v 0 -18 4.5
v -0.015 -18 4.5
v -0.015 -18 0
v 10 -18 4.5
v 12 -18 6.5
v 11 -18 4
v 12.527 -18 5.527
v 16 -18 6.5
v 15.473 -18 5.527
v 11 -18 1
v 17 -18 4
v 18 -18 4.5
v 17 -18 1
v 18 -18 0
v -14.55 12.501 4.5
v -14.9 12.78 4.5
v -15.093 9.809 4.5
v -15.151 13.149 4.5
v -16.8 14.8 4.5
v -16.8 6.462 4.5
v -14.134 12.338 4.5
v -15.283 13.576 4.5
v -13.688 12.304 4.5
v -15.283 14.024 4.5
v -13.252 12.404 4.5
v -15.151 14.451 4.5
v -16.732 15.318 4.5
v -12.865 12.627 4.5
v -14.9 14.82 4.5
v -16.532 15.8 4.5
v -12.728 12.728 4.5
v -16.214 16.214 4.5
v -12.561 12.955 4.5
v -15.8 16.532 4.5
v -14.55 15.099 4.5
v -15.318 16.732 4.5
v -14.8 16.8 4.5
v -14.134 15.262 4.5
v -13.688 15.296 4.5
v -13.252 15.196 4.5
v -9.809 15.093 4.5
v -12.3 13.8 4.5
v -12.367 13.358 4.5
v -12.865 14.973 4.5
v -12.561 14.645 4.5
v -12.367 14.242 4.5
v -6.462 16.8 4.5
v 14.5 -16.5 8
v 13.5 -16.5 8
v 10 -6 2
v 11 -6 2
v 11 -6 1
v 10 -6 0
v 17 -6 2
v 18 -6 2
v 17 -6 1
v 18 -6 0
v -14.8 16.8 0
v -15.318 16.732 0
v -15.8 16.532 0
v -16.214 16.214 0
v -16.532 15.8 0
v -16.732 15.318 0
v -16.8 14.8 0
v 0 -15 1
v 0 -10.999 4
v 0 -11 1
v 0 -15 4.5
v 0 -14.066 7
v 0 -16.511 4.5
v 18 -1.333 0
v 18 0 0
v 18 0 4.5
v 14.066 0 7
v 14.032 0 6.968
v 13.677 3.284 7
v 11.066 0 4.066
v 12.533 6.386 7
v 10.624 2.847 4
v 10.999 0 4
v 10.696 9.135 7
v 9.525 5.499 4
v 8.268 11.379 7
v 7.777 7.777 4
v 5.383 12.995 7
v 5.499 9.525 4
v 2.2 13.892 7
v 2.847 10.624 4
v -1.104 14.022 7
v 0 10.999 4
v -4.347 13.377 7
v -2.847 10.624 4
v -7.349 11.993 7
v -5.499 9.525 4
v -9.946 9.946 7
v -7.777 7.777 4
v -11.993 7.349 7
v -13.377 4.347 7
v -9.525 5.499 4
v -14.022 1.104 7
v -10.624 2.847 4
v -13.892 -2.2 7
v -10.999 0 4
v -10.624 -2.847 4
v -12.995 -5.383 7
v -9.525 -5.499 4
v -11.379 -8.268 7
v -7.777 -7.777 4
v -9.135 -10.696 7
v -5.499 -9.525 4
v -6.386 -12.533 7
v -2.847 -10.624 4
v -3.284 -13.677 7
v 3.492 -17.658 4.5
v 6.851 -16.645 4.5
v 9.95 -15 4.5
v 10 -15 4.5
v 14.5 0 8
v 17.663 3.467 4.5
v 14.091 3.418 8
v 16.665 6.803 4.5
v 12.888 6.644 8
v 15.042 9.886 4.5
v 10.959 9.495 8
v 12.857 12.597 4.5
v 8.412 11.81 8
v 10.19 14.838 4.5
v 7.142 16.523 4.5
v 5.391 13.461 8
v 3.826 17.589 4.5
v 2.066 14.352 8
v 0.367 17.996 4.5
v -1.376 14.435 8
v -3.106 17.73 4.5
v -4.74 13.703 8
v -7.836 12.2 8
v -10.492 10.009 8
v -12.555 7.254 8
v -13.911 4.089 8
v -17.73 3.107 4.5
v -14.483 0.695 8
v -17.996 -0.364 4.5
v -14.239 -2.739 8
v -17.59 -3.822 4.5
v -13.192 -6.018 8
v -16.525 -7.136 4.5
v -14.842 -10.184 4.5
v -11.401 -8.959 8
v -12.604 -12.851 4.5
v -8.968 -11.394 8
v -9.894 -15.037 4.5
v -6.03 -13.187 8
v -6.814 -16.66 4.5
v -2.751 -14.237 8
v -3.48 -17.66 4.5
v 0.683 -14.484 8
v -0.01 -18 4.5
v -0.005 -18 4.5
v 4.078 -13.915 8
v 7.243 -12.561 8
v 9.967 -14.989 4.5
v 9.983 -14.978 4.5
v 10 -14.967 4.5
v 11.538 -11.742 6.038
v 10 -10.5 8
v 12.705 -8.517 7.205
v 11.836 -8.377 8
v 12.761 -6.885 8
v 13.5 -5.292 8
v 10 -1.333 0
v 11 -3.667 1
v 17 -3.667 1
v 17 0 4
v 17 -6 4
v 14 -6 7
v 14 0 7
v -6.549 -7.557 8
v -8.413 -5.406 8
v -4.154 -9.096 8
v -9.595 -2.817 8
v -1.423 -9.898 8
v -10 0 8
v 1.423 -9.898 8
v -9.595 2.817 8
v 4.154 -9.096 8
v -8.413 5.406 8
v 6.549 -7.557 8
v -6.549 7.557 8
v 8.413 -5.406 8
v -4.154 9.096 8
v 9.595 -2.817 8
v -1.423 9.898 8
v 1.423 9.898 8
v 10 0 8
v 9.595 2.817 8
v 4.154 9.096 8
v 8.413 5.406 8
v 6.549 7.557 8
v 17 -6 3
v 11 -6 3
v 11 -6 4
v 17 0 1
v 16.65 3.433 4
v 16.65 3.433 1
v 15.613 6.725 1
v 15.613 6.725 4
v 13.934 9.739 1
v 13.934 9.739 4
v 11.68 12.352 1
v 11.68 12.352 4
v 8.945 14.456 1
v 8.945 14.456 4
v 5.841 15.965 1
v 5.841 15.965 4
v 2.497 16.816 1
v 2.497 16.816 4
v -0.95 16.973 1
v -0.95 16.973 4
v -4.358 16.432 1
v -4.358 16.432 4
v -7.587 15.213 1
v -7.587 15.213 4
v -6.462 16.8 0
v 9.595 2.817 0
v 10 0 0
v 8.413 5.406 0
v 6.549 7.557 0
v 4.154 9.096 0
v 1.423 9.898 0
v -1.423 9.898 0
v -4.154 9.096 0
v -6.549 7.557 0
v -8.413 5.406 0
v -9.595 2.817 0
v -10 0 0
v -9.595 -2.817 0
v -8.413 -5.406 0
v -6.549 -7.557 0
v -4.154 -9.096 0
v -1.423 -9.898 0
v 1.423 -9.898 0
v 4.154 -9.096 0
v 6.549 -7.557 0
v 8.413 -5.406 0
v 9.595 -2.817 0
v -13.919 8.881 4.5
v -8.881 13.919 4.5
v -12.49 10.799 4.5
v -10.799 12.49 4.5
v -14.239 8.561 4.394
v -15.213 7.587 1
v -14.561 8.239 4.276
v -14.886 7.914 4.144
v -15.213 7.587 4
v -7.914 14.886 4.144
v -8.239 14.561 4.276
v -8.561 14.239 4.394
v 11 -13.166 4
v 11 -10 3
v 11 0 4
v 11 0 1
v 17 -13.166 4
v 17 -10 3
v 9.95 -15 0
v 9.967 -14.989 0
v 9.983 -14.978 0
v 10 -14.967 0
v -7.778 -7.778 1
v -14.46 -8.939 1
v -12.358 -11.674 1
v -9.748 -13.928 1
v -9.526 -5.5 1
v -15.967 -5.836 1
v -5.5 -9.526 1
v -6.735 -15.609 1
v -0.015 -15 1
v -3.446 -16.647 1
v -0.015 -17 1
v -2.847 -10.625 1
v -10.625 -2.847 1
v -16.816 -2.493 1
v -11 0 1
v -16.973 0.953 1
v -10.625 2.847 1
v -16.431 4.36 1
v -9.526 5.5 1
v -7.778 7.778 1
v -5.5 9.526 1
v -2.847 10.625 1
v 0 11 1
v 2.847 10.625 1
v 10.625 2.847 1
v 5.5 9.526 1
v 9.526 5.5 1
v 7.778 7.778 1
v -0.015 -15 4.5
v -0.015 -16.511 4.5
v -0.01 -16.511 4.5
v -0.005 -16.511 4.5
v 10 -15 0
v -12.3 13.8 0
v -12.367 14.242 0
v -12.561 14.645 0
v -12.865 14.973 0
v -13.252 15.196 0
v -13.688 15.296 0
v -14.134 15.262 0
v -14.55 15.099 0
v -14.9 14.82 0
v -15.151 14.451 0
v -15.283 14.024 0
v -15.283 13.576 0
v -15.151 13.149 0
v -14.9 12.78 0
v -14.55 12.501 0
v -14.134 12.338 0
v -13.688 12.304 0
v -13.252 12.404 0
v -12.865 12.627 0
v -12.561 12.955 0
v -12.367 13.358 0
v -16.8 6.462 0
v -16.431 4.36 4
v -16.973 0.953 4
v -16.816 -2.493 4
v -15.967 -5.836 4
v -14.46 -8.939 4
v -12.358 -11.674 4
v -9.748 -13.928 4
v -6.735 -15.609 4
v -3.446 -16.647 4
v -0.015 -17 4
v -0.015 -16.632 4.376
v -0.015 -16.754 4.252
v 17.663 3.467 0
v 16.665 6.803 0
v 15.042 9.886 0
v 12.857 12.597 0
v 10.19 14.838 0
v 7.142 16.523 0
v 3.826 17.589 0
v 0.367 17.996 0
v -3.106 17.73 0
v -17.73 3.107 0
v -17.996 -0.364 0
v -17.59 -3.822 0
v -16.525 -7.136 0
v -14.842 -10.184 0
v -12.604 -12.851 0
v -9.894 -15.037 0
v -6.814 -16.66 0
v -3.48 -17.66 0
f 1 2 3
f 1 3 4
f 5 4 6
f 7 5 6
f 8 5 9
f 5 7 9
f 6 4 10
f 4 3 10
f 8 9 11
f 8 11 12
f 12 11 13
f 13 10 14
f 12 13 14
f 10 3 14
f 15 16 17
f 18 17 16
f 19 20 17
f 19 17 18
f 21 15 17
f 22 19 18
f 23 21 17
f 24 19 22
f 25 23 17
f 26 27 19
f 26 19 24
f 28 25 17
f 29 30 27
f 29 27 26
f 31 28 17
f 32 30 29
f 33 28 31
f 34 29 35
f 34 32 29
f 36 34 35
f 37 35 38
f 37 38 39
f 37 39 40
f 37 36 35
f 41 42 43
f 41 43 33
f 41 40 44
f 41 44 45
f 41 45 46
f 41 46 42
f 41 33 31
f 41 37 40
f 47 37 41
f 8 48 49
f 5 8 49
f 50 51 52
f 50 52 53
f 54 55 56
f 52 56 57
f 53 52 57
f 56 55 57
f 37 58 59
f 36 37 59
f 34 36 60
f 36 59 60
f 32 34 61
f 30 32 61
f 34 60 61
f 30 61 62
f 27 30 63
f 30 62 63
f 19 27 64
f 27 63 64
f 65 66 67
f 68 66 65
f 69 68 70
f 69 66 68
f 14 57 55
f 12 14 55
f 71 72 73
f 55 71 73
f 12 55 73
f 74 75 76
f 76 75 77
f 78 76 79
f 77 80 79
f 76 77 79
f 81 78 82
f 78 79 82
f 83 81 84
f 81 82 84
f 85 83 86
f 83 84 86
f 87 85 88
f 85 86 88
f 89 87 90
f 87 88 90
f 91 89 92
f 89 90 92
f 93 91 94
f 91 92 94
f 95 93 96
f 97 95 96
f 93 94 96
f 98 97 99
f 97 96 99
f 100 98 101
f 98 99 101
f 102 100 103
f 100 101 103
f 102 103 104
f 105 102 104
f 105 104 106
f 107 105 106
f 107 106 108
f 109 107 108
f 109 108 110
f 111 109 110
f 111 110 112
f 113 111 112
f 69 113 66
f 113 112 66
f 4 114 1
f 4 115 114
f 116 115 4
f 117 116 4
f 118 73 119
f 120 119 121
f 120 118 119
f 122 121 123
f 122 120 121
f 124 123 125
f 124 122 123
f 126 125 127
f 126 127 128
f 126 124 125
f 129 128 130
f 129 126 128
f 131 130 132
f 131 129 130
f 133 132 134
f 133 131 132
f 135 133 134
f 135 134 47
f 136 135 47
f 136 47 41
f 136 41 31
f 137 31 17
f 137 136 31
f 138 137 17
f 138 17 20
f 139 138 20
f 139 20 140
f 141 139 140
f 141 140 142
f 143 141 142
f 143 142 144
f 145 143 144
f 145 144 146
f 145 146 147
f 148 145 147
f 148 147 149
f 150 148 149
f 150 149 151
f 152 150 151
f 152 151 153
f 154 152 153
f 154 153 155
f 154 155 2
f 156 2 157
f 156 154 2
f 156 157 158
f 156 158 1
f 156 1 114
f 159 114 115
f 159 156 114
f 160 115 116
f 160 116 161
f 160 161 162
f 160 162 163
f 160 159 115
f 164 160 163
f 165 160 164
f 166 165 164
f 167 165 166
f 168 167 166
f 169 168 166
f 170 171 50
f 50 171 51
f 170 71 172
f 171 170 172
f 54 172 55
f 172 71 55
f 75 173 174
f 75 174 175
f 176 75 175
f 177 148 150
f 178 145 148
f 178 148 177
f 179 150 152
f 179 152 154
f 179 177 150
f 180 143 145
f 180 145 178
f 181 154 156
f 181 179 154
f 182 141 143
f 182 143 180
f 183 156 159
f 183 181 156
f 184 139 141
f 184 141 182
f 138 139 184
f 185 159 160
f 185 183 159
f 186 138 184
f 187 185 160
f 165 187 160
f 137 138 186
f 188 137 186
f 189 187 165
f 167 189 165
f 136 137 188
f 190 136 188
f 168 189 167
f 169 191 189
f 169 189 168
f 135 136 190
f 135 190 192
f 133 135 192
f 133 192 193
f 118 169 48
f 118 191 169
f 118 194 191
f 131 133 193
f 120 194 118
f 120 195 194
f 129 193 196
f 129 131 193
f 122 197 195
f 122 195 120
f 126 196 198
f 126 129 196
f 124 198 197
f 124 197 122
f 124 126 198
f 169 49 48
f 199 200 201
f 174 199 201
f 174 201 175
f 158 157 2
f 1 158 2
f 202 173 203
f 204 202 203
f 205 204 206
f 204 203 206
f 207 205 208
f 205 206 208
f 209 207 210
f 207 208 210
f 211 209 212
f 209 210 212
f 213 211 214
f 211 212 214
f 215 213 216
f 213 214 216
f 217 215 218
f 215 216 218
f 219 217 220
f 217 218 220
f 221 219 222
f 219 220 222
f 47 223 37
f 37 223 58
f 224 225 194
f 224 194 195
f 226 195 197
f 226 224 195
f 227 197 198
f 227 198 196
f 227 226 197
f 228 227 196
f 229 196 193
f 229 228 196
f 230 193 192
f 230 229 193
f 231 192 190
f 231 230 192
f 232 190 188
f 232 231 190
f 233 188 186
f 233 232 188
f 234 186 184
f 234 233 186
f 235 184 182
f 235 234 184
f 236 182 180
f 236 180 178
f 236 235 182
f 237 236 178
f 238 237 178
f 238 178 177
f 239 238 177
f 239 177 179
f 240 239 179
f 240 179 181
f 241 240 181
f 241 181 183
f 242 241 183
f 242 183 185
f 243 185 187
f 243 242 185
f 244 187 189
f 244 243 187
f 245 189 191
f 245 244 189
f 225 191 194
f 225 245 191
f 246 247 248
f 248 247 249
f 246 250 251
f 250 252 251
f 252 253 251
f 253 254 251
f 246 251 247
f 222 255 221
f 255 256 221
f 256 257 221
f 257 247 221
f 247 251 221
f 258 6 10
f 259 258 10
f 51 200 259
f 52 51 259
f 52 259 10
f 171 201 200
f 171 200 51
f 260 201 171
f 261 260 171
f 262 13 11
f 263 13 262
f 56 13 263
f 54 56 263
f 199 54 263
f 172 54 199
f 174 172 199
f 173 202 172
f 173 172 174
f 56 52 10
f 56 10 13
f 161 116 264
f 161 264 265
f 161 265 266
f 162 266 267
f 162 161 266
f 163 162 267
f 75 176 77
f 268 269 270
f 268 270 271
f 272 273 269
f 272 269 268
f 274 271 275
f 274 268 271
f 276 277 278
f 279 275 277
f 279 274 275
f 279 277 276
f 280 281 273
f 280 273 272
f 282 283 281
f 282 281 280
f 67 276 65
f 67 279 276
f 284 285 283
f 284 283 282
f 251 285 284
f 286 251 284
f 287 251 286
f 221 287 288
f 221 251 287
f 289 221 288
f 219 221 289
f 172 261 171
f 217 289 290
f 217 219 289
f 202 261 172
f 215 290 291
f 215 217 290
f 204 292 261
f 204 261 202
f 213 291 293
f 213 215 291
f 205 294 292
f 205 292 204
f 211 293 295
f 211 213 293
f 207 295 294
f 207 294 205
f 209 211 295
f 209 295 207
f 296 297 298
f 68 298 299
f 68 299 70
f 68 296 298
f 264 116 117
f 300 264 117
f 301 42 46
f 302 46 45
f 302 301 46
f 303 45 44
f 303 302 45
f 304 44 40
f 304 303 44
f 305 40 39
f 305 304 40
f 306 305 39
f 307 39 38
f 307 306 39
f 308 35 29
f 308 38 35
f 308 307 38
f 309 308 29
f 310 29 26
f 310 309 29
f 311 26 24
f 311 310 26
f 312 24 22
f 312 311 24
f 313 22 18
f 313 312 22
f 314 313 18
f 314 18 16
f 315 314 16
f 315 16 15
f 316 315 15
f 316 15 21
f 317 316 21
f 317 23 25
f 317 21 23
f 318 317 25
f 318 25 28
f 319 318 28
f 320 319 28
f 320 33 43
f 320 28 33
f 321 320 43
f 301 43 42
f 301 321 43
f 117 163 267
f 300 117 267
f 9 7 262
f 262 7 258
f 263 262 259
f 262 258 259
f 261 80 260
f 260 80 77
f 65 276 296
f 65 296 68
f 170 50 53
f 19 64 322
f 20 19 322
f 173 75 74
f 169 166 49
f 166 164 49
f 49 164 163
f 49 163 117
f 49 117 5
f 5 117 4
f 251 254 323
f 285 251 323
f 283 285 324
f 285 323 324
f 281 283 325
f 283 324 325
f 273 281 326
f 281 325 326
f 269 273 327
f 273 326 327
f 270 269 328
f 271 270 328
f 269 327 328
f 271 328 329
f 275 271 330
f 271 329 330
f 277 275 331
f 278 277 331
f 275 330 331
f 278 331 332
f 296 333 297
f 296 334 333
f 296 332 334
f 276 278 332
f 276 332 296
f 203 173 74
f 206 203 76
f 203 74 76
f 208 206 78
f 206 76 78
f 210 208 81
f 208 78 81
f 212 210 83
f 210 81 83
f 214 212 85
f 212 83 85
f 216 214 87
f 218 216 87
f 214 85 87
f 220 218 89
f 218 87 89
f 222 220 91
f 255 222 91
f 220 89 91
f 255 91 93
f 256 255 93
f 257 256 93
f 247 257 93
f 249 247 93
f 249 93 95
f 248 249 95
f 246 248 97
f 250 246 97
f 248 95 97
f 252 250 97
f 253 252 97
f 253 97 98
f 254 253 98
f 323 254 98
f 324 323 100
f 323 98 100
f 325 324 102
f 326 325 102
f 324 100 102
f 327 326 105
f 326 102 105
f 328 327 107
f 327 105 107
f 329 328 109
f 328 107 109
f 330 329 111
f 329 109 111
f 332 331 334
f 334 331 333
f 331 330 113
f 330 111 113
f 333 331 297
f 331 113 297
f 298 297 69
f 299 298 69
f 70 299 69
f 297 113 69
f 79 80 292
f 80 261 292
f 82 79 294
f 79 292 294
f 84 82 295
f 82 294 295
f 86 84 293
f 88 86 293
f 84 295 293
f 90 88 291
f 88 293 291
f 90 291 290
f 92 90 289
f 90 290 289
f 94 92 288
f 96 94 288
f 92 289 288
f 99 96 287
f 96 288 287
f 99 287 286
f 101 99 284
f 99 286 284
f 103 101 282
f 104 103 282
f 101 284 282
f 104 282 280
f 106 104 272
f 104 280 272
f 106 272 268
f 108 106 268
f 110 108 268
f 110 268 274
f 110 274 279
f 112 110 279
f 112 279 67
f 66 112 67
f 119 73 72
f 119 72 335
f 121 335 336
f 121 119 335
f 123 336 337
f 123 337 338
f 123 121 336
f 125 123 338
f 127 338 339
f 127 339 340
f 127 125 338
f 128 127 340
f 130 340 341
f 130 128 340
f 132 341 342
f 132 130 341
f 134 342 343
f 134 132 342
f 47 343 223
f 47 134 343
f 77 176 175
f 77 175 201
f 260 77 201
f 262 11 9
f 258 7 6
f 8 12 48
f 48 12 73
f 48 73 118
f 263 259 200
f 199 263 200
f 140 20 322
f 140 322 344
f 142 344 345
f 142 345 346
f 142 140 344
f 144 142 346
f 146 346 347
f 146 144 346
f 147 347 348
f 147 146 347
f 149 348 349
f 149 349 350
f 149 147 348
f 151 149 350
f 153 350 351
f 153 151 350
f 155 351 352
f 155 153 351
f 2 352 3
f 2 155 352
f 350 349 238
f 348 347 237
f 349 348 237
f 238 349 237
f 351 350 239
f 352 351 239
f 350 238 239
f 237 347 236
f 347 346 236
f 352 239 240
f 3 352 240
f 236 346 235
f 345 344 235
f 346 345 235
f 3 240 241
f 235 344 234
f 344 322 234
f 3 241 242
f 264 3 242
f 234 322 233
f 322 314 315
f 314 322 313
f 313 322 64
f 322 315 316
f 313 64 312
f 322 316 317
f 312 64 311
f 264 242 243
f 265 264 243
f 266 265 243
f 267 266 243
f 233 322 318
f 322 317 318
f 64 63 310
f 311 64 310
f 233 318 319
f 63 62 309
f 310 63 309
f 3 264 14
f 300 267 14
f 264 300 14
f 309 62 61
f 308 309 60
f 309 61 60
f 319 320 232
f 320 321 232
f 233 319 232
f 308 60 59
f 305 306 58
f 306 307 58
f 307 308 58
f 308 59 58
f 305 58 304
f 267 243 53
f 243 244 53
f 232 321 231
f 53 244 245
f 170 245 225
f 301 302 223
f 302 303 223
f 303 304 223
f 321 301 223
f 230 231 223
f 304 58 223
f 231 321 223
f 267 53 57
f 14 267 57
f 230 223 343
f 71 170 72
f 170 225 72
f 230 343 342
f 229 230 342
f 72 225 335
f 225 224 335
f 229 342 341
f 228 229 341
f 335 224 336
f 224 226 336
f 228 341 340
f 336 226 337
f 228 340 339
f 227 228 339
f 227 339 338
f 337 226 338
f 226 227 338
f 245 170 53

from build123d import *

# Parameters (mm, degrees)
F7_DEPTH       = 18
F8_ANGLE       = 270
F9_DEPTH       = 18
F15_DEPTH      = 6
F16_DEPTH      = 7
F16_DEPTH_BACK = 1
F17_T4_DEPTH   = 22.2867319519
F20_DEPTH      = 4.5
F19_R          = 1.5
F21_DEPTH      = 5
F23_W          = 11.0148127368
F23_H          = 3
F24_DEPTH      = 4.5
F25_SIZE       = 3.5
F26_SIZE       = 1.5


# Not quite as in the source:
# - a fillet or chamfer that OpenCascade refuses, or shapes differently, is made with other operations: its cross-section is extruded or revolved along the edge and cut away or added


with BuildPart() as f5:
    # F0 (on Front) → F5 (revolve)
    with BuildSketch(Plane.XZ):
        Polygon((10, 0), (18, 0), (18, 4.5), (14.5, 8), (10, 8), align=None)
    revolve(axis=Axis((0, 0, 0), (0, 0, 1)))

    # F1 (on Front) → F7 (join)
    with BuildSketch(Plane.XZ):
        Polygon((10, 0), (18, 0), (18, 4.5), (14.5, 8), (10, 8), align=None)
    extrude(amount=F7_DEPTH)


with BuildPart() as f8:
    # F2 (on Front) → F8 (revolve)
    with BuildSketch(Plane.XZ):
        Polygon((10.9985324027, 3.999999641), (11, 1), (17, 1), (17, 4), (14.0656156805, 7), align=None)
    revolve(axis=Axis((0, 0, 0), (0, 0, 1)), revolution_arc=F8_ANGLE)


with BuildPart() as f9:
    # F3 (on Front) → F9 (new body)
    with BuildSketch(Plane.XZ):
        Polygon((11, 4), (11, 1), (17, 1), (17, 4), (14, 7), align=None)
    extrude(amount=F9_DEPTH)


with BuildPart() as f5_1:
    add(f5.part)

    # F10: cut F8
    add(f8.part, mode=Mode.SUBTRACT)

    # F11: cut F9
    add(f9.part, mode=Mode.SUBTRACT)

    # F13 (on offset) → F15 (join)
    with BuildSketch(Plane.YZ.offset(11)):
        Polygon((-6, 7), (-18, 7), (-18, 5.5266313693), (-10, 3), (-6, 3), align=None)
    extrude(amount=F15_DEPTH)

    # F17: chamfer of 2 on 1 edges, made by hand


with BuildPart() as f16:
    # F14 (on offset) → F16 (new body, two sides)
    with BuildSketch(Plane.YZ.offset(11)) as f16_sk:
        Polygon((1, -1), (-6, 2), (-6, -1), align=None)
    extrude(amount=F16_DEPTH)
    extrude(f16_sk.sketch, amount=-F16_DEPTH_BACK)


with BuildPart() as f17_tool2:
    # F17_s3 → F17_t4 (new body)
    with BuildSketch(Plane.XZ.offset(0.8566340241)):
        Polygon((15, 7), (17, 5), (17, 7), align=None)
    extrude(amount=F17_T4_DEPTH)

    split(bisect_by=Plane(origin=(11.25, 0, 11.25), x_dir=(0, 1, 0), z_dir=(0.7071067812, 0, 0.7071067812)), keep=Keep.TOP)


with BuildPart() as f5_2:
    add(f5_1.part)

    # F17_t1: cut F17_tool2
    add(f17_tool2.part, mode=Mode.SUBTRACT)

    # F18: cut F16
    add(f16.part, mode=Mode.SUBTRACT)

    # F6 (on Top) → F20 (join)
    with BuildSketch(Plane.XY):
        with BuildLine():
            Line((-6, 16.8), (-14.8, 16.8))
            ThreePointArc((-14.8, 16.8), (-16.2142135624, 16.2142135624), (-16.8, 14.8))
            Line((-16.8, 14.8), (-16.8, 6))
            Line((-16.8, 6), (-6, 16.8))
        make_face()
    extrude(amount=F20_DEPTH)


with BuildPart() as f21:
    # F19 (on Top) → F21 (new body)
    with BuildSketch(Plane.XY):
        with Locations((-13.8, 13.8)):
            Circle(F19_R)
    extrude(amount=F21_DEPTH)


with BuildPart() as f5_3:
    add(f5_2.part)

    # F22: cut F21
    add(f21.part, mode=Mode.SUBTRACT)

    # F23 (on Top) → F24 (join)
    with BuildSketch(Plane.XY):
        with Locations((5.4925936316, -16.5)):
            Rectangle(F23_W, F23_H)
    extrude(amount=F24_DEPTH)

    # F25
    f25_edges = [f5_3.edges().sort_by_distance(p)[0] for p in [
        (10, -14.25, 8),
    ]]
    chamfer(f25_edges, length=F25_SIZE)

    # F26
    f26_edges = [f5_3.edges().sort_by_distance(p)[0] for p in [
        (14, -18, 8),
    ]]
    chamfer(f26_edges, length=F26_SIZE)


solid = f5_3.part
